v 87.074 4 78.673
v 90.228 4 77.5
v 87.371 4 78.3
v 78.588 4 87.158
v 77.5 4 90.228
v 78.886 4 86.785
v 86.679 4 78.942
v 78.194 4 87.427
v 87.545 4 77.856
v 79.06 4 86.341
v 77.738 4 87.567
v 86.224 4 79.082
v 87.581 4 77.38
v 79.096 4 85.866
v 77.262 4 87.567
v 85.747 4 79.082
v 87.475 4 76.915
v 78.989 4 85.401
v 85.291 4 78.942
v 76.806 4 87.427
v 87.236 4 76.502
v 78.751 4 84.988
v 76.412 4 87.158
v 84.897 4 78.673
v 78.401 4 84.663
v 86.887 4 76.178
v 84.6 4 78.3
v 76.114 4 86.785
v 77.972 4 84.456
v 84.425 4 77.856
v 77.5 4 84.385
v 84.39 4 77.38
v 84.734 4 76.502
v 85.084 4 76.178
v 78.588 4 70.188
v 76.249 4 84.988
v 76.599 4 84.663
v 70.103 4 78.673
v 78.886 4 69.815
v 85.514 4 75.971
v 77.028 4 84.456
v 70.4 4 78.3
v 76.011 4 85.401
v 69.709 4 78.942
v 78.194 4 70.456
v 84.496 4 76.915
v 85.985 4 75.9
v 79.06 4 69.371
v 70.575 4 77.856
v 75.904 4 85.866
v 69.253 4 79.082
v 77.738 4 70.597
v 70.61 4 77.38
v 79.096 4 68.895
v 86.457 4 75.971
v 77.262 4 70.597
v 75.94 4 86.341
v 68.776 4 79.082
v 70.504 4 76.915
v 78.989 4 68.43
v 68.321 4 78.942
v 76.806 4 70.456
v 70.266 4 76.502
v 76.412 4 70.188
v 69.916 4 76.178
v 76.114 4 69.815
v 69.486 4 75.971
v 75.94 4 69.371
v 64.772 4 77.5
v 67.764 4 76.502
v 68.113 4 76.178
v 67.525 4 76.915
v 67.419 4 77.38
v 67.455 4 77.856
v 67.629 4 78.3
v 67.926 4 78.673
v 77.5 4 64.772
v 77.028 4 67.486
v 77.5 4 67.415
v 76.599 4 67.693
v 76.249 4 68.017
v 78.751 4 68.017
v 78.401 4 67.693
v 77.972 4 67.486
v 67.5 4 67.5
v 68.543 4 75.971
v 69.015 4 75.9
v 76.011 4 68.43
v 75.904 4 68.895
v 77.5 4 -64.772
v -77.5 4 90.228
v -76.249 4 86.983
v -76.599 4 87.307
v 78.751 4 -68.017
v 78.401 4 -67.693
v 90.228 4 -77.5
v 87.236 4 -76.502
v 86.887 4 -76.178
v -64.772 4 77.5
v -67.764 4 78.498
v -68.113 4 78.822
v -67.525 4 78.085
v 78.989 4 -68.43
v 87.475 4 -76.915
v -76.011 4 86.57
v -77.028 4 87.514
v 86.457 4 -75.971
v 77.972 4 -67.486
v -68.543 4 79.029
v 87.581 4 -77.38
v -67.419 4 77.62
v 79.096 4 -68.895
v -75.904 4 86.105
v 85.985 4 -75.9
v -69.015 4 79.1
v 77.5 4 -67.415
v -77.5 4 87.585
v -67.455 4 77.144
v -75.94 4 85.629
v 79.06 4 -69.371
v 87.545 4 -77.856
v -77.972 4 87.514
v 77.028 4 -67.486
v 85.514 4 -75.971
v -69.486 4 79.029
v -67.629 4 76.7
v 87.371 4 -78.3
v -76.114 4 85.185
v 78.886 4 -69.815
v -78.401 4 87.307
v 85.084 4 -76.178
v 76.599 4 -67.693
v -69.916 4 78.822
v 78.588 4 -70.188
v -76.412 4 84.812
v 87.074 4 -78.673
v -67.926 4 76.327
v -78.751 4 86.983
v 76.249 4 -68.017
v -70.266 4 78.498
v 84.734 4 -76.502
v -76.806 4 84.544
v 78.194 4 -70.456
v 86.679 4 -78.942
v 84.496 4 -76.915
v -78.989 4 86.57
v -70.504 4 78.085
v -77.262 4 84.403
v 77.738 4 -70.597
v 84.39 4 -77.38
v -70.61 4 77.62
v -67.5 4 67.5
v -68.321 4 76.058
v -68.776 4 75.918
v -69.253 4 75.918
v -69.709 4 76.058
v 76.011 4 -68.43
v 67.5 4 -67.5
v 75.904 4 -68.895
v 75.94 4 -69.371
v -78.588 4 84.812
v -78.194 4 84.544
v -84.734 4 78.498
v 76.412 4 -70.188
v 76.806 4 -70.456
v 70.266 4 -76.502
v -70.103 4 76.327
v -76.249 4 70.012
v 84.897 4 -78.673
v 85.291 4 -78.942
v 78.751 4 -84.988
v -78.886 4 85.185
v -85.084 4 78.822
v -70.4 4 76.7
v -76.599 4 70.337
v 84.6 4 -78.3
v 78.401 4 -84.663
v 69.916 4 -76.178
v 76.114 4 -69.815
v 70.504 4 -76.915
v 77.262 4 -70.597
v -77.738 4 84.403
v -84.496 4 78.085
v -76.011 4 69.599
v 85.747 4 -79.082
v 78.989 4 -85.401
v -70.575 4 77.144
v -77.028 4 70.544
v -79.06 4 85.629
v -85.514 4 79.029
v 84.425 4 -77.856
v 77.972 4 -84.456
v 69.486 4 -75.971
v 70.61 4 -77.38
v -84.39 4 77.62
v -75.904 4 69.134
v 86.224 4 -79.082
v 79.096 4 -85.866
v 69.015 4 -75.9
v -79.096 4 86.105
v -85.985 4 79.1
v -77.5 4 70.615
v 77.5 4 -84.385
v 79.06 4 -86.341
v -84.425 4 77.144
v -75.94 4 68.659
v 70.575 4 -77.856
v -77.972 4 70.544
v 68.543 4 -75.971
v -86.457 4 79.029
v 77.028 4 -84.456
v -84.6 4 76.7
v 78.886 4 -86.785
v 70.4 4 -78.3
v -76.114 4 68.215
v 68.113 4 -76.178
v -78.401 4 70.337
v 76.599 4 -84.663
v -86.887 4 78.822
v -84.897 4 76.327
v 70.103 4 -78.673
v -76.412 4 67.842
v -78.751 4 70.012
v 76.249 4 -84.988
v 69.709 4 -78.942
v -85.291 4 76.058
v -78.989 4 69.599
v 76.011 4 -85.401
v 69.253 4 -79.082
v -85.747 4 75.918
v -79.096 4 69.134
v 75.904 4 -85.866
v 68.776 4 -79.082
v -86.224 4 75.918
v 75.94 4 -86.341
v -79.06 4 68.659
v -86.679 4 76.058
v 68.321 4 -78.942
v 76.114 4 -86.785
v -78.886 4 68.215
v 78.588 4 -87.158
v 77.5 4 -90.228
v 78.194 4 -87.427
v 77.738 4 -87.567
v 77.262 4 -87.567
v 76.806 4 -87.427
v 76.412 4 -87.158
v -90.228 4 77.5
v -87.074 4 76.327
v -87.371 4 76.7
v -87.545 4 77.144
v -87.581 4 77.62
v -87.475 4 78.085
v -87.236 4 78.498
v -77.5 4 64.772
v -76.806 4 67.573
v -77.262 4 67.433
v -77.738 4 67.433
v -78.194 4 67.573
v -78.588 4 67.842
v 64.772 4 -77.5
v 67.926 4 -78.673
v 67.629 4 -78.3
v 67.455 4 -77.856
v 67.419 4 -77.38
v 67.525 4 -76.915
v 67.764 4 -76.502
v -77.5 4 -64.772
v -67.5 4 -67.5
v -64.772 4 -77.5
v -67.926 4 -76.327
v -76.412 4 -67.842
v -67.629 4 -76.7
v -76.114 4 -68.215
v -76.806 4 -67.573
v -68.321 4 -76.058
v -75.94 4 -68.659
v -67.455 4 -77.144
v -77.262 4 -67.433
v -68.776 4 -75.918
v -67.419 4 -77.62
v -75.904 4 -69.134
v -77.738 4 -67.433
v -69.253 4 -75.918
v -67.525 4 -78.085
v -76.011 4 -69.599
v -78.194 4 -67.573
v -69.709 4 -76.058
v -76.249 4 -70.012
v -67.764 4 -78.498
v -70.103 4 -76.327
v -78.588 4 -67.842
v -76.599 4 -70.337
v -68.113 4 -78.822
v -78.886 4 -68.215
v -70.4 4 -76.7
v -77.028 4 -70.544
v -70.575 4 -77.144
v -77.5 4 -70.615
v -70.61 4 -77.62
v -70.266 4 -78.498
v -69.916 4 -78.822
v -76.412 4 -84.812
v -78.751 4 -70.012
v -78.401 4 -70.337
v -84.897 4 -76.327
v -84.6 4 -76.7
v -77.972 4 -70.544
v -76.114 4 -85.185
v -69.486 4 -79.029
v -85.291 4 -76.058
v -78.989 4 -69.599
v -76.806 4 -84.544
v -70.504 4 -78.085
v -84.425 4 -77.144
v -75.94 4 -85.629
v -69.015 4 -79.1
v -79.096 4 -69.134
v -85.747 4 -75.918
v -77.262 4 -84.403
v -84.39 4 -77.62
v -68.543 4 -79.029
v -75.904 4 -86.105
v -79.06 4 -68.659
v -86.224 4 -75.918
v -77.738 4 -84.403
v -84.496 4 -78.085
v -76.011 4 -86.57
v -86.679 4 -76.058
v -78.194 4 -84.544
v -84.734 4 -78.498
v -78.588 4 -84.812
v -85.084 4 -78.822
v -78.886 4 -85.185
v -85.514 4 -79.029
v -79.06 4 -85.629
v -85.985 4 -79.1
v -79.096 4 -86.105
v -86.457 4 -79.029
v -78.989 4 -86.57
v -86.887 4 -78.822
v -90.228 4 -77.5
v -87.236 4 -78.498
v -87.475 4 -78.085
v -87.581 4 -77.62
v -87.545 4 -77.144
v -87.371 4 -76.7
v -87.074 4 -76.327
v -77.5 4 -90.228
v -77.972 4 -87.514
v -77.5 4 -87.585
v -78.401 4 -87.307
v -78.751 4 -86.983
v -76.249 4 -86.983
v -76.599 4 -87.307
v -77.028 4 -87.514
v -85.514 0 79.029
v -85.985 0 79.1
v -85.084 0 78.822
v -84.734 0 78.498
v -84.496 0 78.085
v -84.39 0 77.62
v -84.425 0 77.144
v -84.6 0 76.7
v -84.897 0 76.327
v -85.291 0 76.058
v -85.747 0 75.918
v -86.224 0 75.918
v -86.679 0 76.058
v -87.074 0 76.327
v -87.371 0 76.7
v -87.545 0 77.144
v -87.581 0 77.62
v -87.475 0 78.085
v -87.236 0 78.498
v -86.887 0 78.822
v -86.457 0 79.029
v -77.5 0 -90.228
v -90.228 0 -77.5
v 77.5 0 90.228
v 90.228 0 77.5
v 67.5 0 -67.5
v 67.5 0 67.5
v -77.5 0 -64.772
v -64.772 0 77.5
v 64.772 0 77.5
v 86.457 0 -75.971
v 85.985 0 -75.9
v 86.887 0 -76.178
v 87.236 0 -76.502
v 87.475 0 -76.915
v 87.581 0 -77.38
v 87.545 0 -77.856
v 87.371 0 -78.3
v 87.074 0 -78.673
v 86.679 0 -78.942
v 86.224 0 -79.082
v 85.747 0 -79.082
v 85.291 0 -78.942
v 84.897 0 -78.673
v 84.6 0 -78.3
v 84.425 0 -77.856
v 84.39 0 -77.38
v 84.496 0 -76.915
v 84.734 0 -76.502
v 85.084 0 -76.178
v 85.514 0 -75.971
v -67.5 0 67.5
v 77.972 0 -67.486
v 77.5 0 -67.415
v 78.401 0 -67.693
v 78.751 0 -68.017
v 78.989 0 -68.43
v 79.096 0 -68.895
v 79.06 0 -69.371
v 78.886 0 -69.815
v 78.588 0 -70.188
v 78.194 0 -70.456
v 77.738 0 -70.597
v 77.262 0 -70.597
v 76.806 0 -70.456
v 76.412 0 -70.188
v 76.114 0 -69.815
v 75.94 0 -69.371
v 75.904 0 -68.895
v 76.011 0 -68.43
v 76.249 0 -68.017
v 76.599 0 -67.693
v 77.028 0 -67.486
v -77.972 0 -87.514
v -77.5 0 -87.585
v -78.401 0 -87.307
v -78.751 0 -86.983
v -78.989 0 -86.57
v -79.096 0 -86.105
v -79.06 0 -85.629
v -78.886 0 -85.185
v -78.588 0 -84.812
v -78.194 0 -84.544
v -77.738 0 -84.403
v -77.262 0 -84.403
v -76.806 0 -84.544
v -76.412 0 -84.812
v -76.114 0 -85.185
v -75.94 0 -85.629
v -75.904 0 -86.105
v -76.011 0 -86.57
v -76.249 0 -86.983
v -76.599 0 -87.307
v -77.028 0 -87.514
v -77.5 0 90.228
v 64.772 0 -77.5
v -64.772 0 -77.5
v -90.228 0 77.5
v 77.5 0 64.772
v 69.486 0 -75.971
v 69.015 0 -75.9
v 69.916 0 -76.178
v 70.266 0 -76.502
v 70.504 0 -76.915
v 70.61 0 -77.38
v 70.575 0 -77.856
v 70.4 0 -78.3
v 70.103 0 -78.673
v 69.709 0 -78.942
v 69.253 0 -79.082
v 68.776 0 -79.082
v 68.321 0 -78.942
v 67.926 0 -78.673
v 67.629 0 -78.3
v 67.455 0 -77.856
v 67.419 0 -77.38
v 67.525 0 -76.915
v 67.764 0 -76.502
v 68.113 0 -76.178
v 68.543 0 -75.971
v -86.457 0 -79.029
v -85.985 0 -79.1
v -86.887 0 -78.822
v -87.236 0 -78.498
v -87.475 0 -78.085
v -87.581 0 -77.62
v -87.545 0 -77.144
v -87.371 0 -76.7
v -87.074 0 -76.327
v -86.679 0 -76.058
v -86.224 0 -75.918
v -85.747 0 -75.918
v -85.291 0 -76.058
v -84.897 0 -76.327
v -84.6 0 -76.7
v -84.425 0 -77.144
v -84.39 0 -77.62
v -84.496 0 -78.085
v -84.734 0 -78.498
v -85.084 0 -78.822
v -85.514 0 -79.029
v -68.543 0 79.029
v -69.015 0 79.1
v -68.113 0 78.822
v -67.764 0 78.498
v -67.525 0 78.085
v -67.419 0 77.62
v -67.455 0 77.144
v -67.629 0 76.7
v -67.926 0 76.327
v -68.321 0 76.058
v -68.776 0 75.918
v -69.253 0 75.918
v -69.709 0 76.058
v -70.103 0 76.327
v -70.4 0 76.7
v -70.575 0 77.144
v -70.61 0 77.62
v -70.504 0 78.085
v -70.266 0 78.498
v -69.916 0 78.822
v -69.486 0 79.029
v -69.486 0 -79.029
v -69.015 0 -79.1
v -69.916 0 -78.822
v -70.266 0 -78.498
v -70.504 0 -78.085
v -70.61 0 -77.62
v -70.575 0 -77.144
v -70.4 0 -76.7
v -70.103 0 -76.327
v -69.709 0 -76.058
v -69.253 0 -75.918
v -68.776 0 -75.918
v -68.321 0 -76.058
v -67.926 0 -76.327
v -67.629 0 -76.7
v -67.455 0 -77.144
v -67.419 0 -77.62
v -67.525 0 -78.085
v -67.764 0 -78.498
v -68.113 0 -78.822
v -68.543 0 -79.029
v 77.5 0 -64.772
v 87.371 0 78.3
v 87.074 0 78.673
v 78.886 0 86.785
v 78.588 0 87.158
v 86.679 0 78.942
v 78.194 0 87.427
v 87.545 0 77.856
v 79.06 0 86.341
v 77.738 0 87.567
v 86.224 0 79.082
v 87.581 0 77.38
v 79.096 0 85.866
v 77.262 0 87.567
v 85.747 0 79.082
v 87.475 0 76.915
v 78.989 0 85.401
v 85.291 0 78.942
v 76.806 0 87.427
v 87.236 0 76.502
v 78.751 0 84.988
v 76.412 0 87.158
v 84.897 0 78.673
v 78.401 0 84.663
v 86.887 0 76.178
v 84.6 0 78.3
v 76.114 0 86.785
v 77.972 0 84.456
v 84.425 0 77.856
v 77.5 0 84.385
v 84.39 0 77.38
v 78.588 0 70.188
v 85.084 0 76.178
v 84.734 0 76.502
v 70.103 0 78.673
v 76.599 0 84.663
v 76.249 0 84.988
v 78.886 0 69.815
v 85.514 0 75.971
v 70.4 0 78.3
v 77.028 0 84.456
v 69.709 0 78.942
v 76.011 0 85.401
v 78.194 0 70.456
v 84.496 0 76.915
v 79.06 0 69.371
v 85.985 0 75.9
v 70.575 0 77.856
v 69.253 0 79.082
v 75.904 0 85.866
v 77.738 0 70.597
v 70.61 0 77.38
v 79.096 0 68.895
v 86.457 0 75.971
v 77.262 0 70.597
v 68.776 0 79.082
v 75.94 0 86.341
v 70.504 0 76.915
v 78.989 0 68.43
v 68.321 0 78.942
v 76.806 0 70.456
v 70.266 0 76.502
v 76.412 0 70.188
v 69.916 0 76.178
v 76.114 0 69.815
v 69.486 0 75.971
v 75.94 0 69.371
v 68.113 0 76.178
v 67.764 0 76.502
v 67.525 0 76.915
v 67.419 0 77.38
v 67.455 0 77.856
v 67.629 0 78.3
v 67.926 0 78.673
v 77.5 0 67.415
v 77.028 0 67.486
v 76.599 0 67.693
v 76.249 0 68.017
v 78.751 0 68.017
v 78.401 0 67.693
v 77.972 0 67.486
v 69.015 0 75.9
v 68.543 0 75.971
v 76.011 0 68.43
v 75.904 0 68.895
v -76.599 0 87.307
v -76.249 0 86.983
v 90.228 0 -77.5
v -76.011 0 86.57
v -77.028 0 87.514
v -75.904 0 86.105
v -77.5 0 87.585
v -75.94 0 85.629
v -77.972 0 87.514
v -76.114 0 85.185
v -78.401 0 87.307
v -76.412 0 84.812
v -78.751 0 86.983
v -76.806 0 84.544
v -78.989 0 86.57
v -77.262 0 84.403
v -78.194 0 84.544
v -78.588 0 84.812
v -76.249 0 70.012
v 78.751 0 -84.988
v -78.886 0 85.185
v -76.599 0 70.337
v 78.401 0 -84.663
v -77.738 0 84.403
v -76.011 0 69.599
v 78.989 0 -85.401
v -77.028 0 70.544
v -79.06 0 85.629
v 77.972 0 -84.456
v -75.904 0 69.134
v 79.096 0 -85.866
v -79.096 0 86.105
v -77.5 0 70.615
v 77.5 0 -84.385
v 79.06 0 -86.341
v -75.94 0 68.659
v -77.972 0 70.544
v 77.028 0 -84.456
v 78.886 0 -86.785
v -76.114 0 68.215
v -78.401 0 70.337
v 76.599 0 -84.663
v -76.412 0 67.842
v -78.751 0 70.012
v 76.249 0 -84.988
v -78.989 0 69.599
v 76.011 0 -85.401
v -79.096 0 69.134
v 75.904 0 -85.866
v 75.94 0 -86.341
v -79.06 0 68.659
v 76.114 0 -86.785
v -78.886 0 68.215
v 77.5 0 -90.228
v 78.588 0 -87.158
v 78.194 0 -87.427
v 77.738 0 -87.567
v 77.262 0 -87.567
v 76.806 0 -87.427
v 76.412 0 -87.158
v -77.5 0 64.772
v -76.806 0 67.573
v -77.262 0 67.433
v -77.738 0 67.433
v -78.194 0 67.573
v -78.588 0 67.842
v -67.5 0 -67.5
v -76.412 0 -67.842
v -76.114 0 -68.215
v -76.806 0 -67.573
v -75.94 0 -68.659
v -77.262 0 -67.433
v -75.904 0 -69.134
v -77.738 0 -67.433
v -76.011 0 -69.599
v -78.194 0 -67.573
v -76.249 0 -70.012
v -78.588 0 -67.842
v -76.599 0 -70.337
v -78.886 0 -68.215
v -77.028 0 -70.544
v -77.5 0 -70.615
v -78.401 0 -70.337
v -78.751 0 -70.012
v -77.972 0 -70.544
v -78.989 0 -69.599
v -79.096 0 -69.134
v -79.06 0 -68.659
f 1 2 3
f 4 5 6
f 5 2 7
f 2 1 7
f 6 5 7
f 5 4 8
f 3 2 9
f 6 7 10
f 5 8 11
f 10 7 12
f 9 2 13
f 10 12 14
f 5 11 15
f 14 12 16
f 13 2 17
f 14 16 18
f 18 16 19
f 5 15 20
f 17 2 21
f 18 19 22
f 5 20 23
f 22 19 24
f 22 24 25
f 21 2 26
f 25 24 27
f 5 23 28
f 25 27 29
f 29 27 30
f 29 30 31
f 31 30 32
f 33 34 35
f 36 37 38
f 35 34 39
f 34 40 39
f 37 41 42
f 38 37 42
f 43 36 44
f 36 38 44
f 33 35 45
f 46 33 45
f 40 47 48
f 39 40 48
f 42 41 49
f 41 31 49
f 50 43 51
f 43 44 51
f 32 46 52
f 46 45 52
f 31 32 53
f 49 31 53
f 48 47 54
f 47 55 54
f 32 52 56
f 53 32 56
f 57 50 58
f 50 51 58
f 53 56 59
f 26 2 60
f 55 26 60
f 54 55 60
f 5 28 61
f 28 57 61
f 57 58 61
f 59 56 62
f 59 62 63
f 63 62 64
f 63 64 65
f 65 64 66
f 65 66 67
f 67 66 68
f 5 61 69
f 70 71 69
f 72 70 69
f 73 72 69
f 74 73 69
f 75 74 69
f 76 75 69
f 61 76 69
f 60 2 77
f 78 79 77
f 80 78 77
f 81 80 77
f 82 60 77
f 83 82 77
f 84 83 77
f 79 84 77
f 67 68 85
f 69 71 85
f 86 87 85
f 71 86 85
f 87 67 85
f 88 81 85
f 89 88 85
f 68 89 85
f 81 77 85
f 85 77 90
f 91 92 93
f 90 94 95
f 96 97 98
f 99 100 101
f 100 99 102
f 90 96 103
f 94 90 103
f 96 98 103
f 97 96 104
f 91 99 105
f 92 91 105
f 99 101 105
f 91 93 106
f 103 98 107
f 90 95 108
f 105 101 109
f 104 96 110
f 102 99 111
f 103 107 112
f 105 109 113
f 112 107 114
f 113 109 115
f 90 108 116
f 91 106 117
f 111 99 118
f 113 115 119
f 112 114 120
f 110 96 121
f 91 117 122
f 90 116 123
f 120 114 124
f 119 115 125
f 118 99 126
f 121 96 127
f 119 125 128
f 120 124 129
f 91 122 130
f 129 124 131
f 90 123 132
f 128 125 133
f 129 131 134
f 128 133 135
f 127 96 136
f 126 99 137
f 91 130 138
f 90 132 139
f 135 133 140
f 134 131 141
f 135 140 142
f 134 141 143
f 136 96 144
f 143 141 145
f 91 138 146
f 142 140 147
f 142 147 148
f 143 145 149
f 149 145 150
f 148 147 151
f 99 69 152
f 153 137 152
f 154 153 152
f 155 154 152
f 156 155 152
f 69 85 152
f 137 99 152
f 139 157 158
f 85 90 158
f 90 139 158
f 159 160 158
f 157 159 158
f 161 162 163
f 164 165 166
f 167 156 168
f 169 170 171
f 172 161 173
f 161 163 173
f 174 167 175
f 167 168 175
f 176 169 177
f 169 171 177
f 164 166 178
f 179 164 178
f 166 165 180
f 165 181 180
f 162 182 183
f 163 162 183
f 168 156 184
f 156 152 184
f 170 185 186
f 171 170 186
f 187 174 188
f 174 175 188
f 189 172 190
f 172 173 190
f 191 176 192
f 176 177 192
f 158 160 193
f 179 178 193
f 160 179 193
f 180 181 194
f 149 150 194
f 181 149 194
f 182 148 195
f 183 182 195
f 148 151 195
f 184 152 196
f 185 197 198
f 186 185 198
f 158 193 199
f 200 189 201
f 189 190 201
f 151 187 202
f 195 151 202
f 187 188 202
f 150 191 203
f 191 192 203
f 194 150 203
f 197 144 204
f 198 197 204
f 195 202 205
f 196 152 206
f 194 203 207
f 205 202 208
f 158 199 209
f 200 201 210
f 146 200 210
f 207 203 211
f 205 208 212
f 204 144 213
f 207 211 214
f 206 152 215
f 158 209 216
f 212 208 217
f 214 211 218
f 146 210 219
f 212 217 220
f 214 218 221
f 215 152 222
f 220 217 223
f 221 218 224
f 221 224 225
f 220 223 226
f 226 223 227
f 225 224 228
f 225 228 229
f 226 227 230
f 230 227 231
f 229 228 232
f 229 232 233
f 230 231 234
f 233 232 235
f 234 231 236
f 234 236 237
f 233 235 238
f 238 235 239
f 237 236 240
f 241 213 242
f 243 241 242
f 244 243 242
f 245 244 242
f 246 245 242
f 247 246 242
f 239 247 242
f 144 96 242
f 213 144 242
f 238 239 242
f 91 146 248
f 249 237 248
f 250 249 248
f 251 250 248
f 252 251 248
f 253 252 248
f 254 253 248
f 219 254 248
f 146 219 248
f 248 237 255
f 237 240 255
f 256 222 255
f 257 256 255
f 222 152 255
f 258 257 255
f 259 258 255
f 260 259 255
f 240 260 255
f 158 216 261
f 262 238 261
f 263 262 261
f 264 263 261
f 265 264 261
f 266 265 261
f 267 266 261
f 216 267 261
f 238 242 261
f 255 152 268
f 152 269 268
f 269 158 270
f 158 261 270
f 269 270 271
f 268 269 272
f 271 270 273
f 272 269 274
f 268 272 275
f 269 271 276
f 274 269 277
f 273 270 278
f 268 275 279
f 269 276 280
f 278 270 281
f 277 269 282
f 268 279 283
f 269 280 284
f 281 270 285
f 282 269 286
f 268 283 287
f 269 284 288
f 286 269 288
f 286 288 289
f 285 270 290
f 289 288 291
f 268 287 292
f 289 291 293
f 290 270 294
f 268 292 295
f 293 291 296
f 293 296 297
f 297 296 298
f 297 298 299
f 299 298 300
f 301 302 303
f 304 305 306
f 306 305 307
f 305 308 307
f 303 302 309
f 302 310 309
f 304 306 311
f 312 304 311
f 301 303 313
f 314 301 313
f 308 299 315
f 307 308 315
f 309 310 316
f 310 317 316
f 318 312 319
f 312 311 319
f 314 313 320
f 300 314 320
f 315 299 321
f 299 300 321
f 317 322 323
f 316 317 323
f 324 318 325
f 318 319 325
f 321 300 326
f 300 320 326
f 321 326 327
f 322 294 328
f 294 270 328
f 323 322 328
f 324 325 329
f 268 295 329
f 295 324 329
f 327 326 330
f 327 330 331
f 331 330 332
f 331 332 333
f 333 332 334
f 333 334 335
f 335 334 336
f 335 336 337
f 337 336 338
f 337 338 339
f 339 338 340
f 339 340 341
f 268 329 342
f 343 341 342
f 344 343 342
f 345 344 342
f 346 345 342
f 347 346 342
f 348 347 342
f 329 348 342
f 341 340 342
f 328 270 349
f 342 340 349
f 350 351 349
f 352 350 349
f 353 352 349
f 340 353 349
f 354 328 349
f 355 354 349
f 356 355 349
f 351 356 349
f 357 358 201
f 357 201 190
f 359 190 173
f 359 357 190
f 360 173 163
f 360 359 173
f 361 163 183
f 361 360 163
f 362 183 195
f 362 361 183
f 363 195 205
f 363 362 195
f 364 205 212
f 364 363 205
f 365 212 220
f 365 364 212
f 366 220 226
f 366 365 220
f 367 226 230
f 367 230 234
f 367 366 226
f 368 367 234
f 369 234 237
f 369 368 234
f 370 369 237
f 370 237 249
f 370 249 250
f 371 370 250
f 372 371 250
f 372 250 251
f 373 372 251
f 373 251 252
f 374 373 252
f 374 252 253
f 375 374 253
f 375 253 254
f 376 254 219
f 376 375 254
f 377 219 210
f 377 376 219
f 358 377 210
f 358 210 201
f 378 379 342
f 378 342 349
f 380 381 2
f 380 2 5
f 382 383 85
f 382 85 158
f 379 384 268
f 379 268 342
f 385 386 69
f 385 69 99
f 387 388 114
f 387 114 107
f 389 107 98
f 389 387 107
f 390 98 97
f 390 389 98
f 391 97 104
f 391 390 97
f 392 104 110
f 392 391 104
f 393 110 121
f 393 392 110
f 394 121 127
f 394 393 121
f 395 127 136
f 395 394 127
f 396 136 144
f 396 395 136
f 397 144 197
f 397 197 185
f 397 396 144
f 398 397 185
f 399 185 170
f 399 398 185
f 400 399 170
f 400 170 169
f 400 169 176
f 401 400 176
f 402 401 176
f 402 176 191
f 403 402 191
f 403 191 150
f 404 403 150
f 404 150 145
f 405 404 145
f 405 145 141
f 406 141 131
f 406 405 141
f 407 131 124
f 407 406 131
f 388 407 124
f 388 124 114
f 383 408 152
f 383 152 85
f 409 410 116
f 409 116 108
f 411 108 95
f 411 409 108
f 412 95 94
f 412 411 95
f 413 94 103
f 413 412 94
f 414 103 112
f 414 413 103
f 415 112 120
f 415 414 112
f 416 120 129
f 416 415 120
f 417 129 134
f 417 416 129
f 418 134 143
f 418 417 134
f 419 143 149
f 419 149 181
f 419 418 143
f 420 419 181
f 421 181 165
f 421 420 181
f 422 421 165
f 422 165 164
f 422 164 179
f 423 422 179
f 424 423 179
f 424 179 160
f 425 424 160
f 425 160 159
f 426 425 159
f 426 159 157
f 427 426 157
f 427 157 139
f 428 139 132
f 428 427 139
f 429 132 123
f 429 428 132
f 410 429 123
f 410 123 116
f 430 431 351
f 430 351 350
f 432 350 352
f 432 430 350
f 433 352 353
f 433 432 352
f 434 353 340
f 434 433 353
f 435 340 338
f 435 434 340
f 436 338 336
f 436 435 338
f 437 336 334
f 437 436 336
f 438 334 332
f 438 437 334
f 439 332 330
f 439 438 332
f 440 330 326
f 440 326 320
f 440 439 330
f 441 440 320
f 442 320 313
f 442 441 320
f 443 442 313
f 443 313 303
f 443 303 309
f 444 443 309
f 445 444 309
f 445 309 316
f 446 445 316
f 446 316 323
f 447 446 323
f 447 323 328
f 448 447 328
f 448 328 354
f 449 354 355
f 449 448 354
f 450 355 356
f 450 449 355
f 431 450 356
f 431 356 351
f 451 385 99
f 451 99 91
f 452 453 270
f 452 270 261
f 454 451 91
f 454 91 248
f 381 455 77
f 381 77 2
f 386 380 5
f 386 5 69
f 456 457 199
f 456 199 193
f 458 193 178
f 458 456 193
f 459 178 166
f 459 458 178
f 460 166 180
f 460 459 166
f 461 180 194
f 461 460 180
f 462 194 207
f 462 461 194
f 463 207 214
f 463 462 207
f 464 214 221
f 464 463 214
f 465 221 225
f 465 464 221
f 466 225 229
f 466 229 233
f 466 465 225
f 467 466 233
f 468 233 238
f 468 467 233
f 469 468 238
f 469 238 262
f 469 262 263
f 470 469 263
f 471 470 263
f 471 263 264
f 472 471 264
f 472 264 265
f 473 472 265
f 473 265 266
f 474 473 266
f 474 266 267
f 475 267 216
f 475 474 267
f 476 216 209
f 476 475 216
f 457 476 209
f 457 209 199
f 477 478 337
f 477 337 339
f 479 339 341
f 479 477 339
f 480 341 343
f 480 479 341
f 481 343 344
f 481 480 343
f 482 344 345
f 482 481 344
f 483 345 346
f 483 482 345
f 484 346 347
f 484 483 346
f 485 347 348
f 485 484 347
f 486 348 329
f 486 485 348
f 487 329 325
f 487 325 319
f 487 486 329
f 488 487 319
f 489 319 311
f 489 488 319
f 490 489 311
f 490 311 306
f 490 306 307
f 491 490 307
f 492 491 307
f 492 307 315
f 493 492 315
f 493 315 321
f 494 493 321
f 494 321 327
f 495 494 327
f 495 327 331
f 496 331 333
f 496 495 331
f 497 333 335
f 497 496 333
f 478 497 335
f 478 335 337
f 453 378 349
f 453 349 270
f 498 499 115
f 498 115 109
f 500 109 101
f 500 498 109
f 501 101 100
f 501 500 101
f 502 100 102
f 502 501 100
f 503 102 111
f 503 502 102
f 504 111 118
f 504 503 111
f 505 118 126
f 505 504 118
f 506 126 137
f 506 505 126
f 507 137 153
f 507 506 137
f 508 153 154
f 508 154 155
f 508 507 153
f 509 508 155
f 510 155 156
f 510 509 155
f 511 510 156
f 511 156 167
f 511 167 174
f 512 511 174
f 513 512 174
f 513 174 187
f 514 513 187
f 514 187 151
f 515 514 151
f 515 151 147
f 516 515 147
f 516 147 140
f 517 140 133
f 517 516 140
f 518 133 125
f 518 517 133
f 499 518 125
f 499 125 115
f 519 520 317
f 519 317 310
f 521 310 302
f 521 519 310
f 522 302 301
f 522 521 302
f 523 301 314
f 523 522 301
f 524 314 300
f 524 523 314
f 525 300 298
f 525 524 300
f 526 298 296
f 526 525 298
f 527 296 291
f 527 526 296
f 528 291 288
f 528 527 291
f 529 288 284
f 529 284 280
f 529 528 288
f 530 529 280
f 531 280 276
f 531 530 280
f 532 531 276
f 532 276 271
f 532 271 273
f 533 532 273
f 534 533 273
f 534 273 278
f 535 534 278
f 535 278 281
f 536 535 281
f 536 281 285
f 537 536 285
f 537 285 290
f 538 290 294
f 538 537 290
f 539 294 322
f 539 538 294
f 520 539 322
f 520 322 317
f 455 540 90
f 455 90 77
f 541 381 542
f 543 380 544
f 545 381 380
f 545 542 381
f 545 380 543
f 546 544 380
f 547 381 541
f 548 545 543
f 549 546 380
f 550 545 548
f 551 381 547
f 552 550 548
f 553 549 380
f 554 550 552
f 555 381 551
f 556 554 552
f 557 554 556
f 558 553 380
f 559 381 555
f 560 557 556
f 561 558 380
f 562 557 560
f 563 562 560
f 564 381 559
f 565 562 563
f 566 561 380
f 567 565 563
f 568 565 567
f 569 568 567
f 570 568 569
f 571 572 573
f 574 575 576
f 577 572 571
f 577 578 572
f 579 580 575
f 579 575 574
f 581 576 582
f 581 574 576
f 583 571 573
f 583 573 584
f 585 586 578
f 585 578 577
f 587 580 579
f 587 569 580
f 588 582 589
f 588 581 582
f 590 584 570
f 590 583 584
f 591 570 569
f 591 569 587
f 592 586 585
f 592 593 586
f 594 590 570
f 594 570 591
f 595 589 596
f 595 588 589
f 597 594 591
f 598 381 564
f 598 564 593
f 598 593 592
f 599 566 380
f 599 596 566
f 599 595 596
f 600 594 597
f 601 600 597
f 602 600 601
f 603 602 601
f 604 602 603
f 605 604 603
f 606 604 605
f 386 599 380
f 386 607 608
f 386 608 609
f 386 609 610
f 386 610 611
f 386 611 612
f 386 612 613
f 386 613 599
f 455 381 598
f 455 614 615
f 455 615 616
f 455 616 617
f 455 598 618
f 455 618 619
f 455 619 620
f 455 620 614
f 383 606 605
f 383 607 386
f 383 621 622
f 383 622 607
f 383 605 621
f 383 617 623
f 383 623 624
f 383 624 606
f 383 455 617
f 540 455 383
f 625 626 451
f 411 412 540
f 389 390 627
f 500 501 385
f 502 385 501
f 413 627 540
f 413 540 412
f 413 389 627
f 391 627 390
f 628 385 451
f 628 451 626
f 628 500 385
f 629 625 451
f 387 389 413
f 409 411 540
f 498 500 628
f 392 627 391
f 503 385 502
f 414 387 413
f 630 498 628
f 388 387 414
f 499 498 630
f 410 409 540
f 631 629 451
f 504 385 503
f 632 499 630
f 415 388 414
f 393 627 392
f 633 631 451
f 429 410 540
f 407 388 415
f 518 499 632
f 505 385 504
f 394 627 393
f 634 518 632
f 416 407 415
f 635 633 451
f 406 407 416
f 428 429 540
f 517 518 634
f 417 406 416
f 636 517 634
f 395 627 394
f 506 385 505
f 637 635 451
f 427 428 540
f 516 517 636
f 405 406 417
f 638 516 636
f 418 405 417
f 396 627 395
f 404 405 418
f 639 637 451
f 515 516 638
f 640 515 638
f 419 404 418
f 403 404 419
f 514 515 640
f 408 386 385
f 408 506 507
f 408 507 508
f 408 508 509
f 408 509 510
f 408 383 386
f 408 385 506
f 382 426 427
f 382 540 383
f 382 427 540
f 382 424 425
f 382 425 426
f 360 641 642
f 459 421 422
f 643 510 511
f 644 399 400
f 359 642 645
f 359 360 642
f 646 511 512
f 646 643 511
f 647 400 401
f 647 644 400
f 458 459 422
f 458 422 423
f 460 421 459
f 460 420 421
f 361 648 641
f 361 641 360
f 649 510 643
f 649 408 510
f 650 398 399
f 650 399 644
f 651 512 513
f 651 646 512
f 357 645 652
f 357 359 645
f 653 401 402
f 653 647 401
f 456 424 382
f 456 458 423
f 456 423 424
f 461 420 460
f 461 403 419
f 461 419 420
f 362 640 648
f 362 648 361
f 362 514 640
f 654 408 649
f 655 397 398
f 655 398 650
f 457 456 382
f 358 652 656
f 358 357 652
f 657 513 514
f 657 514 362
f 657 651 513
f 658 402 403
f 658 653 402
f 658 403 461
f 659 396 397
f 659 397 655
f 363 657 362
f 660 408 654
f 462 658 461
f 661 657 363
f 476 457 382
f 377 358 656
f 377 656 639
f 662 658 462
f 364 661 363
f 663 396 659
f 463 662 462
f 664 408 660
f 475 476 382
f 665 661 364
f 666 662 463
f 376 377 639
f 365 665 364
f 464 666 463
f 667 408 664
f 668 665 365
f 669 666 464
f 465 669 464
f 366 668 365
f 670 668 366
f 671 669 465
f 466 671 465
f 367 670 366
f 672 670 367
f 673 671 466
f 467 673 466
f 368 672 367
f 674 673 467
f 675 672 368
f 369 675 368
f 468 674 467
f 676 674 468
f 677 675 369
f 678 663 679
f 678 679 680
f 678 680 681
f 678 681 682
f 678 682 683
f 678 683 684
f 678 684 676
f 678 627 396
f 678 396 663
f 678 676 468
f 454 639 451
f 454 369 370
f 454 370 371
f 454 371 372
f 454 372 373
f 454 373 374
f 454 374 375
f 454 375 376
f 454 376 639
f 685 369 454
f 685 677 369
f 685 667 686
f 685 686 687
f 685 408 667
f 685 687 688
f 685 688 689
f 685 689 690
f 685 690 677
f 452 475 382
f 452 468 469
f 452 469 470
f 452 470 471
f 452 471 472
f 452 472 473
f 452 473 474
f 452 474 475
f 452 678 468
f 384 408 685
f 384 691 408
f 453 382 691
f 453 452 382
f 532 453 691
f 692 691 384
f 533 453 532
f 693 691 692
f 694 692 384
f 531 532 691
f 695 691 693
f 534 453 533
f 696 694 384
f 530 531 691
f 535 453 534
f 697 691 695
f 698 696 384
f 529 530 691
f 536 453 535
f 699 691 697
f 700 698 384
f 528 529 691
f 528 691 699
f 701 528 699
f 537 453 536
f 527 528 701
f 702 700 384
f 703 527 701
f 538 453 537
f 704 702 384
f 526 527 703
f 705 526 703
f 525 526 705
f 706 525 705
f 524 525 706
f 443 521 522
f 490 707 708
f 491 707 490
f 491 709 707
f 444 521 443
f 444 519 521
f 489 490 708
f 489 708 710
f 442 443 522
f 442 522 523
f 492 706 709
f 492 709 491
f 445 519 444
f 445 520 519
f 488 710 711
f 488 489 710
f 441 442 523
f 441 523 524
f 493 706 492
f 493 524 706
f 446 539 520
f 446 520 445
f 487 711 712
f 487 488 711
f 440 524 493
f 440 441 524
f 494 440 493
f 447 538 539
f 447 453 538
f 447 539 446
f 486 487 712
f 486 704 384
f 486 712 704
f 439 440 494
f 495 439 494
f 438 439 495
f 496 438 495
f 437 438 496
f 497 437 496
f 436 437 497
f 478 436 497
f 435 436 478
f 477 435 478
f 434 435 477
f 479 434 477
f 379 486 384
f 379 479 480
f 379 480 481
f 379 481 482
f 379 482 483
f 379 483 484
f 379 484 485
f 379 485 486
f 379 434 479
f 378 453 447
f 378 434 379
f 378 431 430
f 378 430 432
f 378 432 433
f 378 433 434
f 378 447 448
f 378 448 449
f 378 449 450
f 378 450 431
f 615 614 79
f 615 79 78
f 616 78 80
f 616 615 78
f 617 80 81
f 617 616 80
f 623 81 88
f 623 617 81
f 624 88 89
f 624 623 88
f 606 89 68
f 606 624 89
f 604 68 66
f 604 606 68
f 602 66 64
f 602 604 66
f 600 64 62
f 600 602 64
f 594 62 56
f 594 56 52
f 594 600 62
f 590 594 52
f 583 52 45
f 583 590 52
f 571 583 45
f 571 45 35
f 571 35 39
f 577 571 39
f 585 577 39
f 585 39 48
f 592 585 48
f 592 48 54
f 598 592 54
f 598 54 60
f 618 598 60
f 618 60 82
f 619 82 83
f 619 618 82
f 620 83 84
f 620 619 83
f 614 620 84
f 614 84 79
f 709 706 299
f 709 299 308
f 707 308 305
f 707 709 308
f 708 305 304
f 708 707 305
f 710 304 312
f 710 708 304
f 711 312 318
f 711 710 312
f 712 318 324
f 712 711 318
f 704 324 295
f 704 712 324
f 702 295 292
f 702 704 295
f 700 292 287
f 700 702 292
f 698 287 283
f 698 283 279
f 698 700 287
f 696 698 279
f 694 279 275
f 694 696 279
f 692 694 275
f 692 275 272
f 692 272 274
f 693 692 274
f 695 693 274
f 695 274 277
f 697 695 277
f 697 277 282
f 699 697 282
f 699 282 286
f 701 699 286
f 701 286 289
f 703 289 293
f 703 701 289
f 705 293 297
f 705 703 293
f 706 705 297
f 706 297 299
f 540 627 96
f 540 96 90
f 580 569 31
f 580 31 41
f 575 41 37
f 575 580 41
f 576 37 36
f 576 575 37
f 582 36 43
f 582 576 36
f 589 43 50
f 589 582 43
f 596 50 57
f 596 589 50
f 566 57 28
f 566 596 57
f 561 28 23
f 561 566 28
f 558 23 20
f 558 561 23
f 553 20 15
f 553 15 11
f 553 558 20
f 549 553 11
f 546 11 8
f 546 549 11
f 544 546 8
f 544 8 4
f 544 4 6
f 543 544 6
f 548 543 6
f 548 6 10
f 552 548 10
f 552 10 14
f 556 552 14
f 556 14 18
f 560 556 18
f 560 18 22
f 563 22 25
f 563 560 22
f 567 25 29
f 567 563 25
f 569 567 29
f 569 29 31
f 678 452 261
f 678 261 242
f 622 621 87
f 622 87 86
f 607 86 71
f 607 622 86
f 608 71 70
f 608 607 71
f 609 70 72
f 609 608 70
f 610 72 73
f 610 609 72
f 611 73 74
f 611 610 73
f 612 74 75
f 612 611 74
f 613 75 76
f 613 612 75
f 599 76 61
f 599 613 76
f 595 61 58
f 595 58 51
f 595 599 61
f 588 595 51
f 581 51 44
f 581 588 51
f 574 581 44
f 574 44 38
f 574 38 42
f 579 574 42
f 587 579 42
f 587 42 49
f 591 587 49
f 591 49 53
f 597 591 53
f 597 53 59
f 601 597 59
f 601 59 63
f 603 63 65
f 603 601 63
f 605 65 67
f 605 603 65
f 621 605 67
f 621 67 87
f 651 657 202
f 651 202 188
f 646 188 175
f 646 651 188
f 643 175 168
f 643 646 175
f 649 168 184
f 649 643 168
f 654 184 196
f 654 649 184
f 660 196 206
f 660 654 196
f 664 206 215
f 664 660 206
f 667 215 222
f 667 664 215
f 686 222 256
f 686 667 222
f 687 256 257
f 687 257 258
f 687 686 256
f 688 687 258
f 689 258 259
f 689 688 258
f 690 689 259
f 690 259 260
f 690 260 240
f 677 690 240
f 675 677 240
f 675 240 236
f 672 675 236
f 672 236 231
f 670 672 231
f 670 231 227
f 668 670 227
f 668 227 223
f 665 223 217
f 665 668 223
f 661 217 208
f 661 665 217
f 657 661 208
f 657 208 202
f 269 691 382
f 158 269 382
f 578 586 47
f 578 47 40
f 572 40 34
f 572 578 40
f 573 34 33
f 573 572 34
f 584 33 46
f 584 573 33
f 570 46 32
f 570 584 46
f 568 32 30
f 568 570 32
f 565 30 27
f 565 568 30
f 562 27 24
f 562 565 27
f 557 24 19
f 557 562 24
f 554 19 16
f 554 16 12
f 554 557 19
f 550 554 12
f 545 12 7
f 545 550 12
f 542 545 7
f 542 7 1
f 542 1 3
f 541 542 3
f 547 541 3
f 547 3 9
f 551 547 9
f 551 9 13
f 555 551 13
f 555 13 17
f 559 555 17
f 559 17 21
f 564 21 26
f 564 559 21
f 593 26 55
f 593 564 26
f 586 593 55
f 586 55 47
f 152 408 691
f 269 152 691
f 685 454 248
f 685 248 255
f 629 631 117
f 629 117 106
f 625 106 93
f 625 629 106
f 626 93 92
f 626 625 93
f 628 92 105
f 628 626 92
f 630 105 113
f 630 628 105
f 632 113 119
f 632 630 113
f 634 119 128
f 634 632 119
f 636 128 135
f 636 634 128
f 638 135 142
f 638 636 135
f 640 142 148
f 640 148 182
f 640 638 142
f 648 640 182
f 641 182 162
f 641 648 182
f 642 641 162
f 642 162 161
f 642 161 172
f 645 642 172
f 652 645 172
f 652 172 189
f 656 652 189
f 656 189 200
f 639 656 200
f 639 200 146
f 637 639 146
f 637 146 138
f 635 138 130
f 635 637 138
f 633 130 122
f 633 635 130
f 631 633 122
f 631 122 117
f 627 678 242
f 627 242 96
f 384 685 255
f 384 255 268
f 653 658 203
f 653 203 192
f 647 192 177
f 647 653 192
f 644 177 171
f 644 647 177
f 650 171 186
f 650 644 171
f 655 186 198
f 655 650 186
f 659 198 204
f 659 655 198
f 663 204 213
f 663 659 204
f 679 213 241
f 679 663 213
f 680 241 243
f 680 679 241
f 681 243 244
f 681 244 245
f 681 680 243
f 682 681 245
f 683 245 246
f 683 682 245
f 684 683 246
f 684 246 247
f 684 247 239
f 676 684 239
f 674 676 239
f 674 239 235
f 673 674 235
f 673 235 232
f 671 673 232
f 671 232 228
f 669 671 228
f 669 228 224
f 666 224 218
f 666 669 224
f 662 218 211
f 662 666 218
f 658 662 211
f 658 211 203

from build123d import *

# Parameters (mm, degrees)
SKETCH_1_R      = 1.6
SKETCH_1_W      = 135
SKETCH_1_H      = 135
EXTRUDE_1_DEPTH = 4


with BuildPart() as part:
    # 草图1 → 凸台-拉伸1 (new body)
    with BuildSketch(Plane(origin=(0, 0, 0), x_dir=(1, 0, 0), z_dir=(0, 1, 0))):
        Polygon((90.227922061, 77.5), (77.5, 64.772077939), (77.5, -64.772077939), (90.227922061, -77.5), (77.5, -90.227922061), (64.772077939, -77.5), (-64.772077939, -77.5), (-77.5, -90.227922061), (-90.227922061, -77.5), (-77.5, -64.772077939), (-77.5, 64.772077939), (-90.227922061, 77.5), (-77.5, 90.227922061), (-64.772077939, 77.5), (64.772077939, 77.5), (77.5, 90.227922061), align=None)
        with Locations(Location((77.5, 85.985281374, 0), (0, 0, 270))):
            Circle(SKETCH_1_R, mode=Mode.SUBTRACT)
        with Locations(Location((69.014718626, 77.5, 0), (0, 0, 270))):
            Circle(SKETCH_1_R, mode=Mode.SUBTRACT)
        with Locations(Location((77.5, 69.014718626, 0), (0, 0, 270))):
            Circle(SKETCH_1_R, mode=Mode.SUBTRACT)
        with Locations(Location((85.985281374, 77.5, 0), (0, 0, 270))):
            Circle(SKETCH_1_R, mode=Mode.SUBTRACT)
        with Locations(Location((85.985281374, -77.5, 0), (0, 0, 90))):
            Circle(SKETCH_1_R, mode=Mode.SUBTRACT)
        with Locations(Location((77.5, -69.014718626, 0), (0, 0, 90))):
            Circle(SKETCH_1_R, mode=Mode.SUBTRACT)
        with Locations(Location((69.014718626, -77.5, 0), (0, 0, 90))):
            Circle(SKETCH_1_R, mode=Mode.SUBTRACT)
        with Locations(Location((77.5, -85.985281374, 0), (0, 0, 90))):
            Circle(SKETCH_1_R, mode=Mode.SUBTRACT)
        with Locations(Location((-77.5, -85.985281374, 0), (0, 0, 270))):
            Circle(SKETCH_1_R, mode=Mode.SUBTRACT)
        with Locations(Location((-69.014718626, -77.5, 0), (0, 0, 270))):
            Circle(SKETCH_1_R, mode=Mode.SUBTRACT)
        with Locations(Location((-77.5, -69.014718626, 0), (0, 0, 270))):
            Circle(SKETCH_1_R, mode=Mode.SUBTRACT)
        with Locations(Location((-85.985281374, -77.5, 0), (0, 0, 270))):
            Circle(SKETCH_1_R, mode=Mode.SUBTRACT)
        with Locations(Location((-85.985281374, 77.5, 0), (0, 0, 90))):
            Circle(SKETCH_1_R, mode=Mode.SUBTRACT)
        with Locations(Location((-77.5, 69.014718626, 0), (0, 0, 90))):
            Circle(SKETCH_1_R, mode=Mode.SUBTRACT)
        with Locations(Location((-69.014718626, 77.5, 0), (0, 0, 90))):
            Circle(SKETCH_1_R, mode=Mode.SUBTRACT)
        with Locations(Location((-77.5, 85.985281374, 0), (0, 0, 90))):
            Circle(SKETCH_1_R, mode=Mode.SUBTRACT)
        Rectangle(SKETCH_1_W, SKETCH_1_H, mode=Mode.SUBTRACT)
    extrude(amount=EXTRUDE_1_DEPTH)


solid = part.part
